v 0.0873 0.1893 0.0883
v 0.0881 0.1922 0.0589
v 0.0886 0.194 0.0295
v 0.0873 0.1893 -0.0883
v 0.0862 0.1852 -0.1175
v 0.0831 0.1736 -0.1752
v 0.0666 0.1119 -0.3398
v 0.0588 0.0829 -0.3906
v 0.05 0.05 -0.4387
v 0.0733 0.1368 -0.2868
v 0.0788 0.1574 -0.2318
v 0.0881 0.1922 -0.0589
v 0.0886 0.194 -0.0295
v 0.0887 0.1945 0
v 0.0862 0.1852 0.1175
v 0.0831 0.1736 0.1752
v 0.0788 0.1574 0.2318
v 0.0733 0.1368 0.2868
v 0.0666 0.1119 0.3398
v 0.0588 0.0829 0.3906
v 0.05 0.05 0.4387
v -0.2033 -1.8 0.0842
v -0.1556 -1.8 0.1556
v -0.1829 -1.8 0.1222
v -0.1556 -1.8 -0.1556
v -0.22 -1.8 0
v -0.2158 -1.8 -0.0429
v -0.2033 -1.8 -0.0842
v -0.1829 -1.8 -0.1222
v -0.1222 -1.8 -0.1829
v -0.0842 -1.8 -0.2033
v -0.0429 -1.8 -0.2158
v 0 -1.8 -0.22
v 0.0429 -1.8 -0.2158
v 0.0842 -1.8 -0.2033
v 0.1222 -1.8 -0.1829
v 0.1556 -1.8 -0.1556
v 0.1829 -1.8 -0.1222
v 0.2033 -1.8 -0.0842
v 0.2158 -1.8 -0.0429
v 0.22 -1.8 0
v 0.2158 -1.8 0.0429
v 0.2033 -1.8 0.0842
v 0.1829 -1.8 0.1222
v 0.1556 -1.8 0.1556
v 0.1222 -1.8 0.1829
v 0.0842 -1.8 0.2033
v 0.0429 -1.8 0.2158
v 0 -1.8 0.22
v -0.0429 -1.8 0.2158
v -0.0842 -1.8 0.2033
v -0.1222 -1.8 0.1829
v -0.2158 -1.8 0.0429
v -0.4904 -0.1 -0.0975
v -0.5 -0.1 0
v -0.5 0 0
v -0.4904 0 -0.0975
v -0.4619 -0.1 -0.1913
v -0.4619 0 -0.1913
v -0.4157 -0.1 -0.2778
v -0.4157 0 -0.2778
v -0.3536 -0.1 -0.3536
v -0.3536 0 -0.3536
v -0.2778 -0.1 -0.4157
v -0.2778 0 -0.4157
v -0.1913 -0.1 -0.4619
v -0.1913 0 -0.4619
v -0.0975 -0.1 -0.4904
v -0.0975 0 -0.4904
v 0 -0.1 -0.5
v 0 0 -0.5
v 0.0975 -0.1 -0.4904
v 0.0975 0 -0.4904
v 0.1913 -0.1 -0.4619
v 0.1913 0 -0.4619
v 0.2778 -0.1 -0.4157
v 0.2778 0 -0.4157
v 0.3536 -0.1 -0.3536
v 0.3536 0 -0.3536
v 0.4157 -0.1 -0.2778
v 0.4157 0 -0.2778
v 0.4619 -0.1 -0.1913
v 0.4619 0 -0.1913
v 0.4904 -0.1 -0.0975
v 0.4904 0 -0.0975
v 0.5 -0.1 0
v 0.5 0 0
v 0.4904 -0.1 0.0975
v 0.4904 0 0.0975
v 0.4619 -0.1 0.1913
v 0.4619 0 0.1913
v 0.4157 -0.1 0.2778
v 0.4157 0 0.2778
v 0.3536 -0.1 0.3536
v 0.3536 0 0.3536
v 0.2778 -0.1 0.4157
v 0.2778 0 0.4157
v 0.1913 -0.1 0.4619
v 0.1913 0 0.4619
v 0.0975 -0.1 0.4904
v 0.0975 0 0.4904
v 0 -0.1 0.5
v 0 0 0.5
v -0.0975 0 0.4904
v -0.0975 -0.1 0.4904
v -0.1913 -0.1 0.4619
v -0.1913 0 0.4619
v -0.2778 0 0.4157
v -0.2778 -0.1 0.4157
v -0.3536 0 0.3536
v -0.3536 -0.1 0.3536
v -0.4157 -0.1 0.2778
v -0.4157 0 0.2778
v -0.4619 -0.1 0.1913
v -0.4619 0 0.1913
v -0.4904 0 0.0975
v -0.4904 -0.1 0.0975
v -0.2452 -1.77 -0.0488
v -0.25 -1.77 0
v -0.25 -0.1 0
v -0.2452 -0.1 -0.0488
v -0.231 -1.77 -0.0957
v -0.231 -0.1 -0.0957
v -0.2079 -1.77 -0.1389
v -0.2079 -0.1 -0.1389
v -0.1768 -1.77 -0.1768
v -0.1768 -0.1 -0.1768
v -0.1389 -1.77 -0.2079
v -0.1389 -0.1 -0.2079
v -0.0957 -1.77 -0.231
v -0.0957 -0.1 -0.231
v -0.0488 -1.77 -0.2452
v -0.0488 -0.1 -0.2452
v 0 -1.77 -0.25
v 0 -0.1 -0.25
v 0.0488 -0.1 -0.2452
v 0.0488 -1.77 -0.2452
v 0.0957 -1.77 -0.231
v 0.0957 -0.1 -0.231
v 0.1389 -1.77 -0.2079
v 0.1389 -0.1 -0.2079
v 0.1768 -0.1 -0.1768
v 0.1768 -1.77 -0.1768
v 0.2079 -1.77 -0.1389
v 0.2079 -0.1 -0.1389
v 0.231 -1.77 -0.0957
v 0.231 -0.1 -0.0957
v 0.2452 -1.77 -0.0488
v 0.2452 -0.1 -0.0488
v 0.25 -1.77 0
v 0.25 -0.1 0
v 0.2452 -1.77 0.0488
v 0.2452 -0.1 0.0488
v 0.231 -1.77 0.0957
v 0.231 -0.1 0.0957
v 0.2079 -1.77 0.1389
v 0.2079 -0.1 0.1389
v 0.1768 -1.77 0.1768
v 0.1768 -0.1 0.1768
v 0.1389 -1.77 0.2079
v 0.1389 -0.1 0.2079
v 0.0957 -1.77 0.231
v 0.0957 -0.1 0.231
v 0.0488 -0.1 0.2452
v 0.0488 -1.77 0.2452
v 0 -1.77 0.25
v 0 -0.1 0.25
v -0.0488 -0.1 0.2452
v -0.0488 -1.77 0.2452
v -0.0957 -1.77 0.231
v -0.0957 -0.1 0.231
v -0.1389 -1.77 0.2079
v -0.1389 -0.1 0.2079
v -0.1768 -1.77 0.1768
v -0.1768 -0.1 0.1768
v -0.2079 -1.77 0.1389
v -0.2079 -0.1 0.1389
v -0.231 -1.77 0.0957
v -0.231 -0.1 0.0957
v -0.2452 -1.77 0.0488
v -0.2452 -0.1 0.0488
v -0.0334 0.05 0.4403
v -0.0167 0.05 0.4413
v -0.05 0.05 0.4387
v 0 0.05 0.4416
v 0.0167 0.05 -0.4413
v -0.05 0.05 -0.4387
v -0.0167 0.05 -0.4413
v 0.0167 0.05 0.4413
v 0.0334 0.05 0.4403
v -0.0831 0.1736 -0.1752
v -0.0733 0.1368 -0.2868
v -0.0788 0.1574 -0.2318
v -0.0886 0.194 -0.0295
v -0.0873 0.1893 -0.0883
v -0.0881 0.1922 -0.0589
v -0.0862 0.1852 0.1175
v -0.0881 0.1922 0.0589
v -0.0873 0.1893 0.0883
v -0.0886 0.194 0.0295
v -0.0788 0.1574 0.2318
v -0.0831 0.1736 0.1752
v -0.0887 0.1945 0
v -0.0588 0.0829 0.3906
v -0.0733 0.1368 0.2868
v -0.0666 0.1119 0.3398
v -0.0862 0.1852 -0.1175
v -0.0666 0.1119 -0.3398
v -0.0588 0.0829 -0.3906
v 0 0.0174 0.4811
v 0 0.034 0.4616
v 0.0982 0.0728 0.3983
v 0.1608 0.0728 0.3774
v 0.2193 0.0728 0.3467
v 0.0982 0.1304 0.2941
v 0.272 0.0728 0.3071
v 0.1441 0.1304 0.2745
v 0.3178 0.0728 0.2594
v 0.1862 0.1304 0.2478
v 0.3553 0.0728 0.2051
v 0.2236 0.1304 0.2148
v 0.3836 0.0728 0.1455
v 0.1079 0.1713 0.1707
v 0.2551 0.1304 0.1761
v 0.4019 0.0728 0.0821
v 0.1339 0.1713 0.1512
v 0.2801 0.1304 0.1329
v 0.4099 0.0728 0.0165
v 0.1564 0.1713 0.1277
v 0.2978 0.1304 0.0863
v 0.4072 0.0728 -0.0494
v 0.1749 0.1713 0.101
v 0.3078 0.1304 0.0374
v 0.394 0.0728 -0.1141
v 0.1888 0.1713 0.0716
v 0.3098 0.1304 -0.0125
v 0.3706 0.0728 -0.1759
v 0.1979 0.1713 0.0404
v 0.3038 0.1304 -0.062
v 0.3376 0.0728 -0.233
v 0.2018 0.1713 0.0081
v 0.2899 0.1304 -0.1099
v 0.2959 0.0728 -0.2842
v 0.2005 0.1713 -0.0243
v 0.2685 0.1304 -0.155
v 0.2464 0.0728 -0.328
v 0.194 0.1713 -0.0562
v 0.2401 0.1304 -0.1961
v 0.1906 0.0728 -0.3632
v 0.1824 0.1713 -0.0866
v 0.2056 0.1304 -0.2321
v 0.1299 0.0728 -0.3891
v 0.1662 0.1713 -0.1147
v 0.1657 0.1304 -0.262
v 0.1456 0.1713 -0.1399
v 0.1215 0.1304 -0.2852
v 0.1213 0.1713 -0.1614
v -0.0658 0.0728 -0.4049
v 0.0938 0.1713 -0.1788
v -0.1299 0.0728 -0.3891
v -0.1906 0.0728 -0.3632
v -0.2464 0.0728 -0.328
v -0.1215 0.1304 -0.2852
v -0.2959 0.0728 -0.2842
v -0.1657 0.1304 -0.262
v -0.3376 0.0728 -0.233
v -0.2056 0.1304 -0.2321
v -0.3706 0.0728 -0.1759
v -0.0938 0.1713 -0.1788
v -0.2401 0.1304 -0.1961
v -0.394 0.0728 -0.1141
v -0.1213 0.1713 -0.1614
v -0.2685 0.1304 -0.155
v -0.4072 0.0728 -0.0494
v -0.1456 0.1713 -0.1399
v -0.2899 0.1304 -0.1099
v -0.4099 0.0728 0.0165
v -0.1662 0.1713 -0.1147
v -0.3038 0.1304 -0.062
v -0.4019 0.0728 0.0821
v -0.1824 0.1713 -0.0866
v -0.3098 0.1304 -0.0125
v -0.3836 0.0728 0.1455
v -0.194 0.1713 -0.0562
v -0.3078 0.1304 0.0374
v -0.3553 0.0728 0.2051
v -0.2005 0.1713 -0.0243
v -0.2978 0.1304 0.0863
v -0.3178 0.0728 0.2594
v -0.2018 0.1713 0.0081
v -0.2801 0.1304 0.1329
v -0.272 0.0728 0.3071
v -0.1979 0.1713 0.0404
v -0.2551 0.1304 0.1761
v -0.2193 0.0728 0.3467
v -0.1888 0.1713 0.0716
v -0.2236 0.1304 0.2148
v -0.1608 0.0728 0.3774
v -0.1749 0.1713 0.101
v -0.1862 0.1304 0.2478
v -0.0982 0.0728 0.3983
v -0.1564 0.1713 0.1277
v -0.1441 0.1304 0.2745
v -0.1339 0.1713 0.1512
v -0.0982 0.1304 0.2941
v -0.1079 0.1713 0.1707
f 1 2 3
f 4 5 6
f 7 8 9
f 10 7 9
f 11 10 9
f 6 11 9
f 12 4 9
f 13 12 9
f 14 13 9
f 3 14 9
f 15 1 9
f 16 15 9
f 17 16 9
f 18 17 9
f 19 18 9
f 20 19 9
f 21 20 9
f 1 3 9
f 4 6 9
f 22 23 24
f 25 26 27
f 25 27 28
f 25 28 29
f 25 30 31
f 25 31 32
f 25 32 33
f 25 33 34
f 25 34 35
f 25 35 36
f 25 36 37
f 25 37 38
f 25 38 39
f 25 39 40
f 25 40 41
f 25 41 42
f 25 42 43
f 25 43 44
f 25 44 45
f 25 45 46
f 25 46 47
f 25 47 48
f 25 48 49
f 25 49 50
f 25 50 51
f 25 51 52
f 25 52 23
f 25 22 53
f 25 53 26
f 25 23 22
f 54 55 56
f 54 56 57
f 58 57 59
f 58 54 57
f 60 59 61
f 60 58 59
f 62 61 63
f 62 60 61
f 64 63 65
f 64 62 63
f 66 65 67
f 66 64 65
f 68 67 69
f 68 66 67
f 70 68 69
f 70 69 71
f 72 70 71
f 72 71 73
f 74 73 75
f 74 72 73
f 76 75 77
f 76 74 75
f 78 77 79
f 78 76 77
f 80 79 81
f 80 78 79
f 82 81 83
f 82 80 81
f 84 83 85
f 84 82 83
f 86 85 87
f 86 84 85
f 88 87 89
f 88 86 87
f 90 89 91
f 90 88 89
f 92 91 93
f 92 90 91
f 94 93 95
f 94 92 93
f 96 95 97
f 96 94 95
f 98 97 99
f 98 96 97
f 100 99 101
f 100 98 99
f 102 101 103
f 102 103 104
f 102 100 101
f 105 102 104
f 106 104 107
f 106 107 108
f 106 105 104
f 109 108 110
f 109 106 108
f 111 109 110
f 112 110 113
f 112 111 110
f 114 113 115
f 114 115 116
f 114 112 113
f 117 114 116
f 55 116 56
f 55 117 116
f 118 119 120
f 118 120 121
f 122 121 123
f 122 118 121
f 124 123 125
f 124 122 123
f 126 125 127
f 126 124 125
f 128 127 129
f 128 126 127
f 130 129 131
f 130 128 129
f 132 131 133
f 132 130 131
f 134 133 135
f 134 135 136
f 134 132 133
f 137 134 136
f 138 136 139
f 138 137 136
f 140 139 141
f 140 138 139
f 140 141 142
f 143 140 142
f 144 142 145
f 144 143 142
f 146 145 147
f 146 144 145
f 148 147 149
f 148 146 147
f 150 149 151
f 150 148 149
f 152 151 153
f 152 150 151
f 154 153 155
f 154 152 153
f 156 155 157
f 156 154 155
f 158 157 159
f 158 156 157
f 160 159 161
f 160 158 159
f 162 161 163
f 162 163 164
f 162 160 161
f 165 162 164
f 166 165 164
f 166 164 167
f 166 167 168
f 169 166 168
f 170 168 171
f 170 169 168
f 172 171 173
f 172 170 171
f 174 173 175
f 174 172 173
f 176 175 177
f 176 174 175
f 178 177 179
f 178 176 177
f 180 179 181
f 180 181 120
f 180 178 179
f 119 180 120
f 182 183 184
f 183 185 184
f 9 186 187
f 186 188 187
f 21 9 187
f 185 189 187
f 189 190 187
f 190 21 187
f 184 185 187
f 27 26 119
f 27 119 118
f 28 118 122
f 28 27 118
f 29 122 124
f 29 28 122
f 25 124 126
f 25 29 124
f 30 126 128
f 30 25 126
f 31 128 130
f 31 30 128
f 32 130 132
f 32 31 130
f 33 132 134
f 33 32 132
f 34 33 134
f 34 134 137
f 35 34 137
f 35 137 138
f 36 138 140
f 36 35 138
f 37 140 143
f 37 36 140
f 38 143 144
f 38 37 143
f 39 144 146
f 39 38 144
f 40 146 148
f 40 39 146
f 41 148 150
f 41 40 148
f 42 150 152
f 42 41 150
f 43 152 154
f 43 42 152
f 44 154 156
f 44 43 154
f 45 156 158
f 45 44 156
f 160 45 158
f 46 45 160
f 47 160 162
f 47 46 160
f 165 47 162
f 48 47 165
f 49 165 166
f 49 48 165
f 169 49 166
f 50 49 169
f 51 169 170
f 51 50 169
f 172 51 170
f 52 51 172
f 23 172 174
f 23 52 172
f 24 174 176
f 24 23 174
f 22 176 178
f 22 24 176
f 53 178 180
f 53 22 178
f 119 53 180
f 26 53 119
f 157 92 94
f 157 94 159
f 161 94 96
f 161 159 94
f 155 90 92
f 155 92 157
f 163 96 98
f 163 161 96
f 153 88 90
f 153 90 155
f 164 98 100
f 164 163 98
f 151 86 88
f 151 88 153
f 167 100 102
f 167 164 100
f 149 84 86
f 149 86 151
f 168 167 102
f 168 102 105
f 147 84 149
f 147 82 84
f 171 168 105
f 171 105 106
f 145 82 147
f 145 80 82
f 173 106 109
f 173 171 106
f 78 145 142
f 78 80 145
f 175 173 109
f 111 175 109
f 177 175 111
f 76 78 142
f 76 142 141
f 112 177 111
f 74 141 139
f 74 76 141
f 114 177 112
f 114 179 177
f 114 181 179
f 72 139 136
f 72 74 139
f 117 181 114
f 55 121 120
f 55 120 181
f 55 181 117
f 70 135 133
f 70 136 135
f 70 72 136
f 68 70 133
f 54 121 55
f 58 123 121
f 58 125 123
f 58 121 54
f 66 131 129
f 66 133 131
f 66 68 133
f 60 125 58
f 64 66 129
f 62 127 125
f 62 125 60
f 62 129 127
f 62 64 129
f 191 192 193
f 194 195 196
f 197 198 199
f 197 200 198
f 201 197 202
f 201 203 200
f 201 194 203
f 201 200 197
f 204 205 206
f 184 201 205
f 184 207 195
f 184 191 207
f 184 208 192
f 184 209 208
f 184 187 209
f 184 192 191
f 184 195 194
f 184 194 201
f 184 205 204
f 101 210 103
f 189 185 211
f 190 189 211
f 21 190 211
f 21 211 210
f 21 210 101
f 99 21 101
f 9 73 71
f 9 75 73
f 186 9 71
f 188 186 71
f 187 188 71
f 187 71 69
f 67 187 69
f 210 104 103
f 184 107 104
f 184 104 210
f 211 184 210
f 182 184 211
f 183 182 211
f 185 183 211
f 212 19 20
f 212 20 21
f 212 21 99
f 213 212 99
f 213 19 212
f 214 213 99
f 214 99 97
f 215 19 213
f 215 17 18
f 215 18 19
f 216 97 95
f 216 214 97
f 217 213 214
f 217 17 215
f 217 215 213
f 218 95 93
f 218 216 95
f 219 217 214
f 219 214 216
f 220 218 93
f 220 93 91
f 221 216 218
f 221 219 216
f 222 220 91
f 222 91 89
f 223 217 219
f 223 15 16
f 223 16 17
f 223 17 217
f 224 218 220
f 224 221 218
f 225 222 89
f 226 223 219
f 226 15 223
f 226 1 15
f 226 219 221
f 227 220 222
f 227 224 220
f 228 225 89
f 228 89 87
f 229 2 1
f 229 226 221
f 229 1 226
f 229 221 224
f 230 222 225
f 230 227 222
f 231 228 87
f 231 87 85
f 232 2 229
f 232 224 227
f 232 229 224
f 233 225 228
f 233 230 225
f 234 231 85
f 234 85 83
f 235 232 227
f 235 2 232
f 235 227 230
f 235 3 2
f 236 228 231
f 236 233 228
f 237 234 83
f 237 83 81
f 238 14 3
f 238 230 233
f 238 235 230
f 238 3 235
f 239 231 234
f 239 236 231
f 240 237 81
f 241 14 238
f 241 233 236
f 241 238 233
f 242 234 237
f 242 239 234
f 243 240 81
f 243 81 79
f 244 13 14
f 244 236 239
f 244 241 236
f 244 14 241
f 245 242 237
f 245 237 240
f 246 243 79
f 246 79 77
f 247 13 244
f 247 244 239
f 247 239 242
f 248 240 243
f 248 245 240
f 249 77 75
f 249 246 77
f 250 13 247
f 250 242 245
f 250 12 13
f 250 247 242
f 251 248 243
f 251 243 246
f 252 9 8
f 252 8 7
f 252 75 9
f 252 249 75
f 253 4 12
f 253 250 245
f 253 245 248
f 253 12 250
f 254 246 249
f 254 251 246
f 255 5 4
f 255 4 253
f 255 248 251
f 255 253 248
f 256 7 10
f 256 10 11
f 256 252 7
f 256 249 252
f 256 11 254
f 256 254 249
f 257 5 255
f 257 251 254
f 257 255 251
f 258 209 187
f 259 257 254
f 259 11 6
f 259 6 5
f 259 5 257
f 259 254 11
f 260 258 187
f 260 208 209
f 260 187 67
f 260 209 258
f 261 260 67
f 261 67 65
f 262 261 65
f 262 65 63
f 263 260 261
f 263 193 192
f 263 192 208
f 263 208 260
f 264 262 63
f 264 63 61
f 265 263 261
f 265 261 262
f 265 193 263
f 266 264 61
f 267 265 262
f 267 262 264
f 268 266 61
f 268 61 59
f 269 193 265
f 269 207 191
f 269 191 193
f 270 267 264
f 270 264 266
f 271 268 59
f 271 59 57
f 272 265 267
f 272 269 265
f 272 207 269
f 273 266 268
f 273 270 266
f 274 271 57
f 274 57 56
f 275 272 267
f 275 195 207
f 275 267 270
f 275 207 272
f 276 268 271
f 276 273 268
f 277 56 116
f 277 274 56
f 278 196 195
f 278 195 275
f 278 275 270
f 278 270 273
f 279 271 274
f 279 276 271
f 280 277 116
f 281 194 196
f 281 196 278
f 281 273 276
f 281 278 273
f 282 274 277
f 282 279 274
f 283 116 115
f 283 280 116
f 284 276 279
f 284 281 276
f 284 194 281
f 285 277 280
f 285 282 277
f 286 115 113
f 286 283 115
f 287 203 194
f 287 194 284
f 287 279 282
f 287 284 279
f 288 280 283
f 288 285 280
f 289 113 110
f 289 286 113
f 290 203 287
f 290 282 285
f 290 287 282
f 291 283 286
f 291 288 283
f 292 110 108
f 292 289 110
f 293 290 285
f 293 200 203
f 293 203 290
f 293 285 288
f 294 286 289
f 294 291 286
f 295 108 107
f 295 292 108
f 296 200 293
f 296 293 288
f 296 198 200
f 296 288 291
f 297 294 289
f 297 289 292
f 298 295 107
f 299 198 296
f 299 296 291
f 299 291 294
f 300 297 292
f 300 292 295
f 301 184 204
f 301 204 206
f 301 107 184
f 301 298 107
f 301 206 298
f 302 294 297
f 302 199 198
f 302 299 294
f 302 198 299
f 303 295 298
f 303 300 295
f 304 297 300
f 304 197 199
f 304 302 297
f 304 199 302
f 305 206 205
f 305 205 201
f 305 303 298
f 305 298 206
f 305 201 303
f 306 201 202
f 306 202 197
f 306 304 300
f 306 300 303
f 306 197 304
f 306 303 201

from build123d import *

# Parameters (mm, degrees)
DOME1_FACE_RADIUS       = 0.5
DOME1_HEIGHT            = 0.2
CUT_EXTRUDE1_DEPTH      = 1.5
CUT_EXTRUDE1_DEPTH_BACK = 1.5
CHAMFER1_SIZE           = 0.03


with BuildPart() as part:
    # Sketch2 → Revolve5 (revolve)
    with BuildSketch(Plane.XY):
        Polygon((0, 0), (-0.5, 0), (-0.5, -0.1), (-0.25, -0.1), (-0.25, -1.8), (0, -1.8), align=None)
    revolve(axis=Axis((0, 0.341610835, 0), (0, -1, 0)))

    # Dome1: a dome of height H over a round flat face of radius A is a cap of a sphere of radius (A * A + H * H) / (2 * H)
    dome1_r = (DOME1_FACE_RADIUS * DOME1_FACE_RADIUS + DOME1_HEIGHT * DOME1_HEIGHT) / (2 * DOME1_HEIGHT)
    dome1_base = Plane((0, 0, 0), z_dir=(0, 1, 0))
    with Locations(dome1_base.offset(DOME1_HEIGHT - dome1_r)):
        dome1_ball = Sphere(dome1_r, mode=Mode.PRIVATE)
    add(split(dome1_ball, bisect_by=dome1_base, keep=Keep.TOP, mode=Mode.PRIVATE))

    # Sketch3 → Cut-Extrude1 (cut, two sides)
    with BuildSketch(Plane.XY) as cut_extrude1_sk:
        Polygon((3.753414684, 13.871331761), (0.088731951, 0.19454961), (0.05, 0.05), (-0.05, 0.05), (-0.088731951, 0.19454961), (-3.753414684, 13.871331761), (-3.753414684, 42.189825332), (3.753414684, 42.189825332), align=None)
    extrude(amount=CUT_EXTRUDE1_DEPTH, mode=Mode.SUBTRACT)
    extrude(cut_extrude1_sk.sketch, amount=-CUT_EXTRUDE1_DEPTH_BACK, mode=Mode.SUBTRACT)

    # Chamfer1
    chamfer1_edges = [part.edges().sort_by_distance(p)[0] for p in [
        (0.25, -1.8, 0),
    ]]
    chamfer(chamfer1_edges, length=CHAMFER1_SIZE)


solid = part.part
